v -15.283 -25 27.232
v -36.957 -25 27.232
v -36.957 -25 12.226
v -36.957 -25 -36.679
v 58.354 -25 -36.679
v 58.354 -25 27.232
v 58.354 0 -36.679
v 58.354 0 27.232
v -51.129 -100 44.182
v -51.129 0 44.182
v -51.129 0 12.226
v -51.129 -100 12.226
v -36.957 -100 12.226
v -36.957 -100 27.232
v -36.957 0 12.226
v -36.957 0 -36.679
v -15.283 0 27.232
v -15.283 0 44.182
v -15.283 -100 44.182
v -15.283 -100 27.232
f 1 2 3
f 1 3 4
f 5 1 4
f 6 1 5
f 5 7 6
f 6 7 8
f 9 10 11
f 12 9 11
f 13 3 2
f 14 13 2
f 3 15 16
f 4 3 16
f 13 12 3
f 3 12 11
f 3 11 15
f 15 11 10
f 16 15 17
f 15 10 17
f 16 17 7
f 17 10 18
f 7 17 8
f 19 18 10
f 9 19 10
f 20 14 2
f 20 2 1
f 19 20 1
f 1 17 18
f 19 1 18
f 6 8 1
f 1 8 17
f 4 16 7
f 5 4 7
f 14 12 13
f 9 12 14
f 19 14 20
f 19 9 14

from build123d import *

# Parameters (mm, degrees)
F0_W     = 21.674182
F0_H     = 15.005204
F1_DEPTH = 25
F2_DEPTH = 100


with BuildPart() as f1:
    # F0 (on Front) → F1 (new body)
    with BuildSketch(Plane.XZ):
        Polygon((58.353573, 27.231669), (-15.283082, 27.231669), (-15.283082, 12.226465), (-36.957264, 12.226465), (-36.957264, -36.679387), (58.353573, -36.679387), align=None)
        with Locations((-26.120173, 19.729067)):
            Rectangle(F0_W, F0_H)
    extrude(amount=F1_DEPTH)

    # F0 (on Front) → F2 (join)
    with BuildSketch(Plane.XZ):
        Polygon((-36.957264, 12.226465), (-36.957264, 27.231669), (-15.283082, 27.231669), (-15.283082, 44.181995), (-51.128846, 44.181995), (-51.128846, 12.226465), align=None)
    extrude(amount=F2_DEPTH)


solid = f1.part
